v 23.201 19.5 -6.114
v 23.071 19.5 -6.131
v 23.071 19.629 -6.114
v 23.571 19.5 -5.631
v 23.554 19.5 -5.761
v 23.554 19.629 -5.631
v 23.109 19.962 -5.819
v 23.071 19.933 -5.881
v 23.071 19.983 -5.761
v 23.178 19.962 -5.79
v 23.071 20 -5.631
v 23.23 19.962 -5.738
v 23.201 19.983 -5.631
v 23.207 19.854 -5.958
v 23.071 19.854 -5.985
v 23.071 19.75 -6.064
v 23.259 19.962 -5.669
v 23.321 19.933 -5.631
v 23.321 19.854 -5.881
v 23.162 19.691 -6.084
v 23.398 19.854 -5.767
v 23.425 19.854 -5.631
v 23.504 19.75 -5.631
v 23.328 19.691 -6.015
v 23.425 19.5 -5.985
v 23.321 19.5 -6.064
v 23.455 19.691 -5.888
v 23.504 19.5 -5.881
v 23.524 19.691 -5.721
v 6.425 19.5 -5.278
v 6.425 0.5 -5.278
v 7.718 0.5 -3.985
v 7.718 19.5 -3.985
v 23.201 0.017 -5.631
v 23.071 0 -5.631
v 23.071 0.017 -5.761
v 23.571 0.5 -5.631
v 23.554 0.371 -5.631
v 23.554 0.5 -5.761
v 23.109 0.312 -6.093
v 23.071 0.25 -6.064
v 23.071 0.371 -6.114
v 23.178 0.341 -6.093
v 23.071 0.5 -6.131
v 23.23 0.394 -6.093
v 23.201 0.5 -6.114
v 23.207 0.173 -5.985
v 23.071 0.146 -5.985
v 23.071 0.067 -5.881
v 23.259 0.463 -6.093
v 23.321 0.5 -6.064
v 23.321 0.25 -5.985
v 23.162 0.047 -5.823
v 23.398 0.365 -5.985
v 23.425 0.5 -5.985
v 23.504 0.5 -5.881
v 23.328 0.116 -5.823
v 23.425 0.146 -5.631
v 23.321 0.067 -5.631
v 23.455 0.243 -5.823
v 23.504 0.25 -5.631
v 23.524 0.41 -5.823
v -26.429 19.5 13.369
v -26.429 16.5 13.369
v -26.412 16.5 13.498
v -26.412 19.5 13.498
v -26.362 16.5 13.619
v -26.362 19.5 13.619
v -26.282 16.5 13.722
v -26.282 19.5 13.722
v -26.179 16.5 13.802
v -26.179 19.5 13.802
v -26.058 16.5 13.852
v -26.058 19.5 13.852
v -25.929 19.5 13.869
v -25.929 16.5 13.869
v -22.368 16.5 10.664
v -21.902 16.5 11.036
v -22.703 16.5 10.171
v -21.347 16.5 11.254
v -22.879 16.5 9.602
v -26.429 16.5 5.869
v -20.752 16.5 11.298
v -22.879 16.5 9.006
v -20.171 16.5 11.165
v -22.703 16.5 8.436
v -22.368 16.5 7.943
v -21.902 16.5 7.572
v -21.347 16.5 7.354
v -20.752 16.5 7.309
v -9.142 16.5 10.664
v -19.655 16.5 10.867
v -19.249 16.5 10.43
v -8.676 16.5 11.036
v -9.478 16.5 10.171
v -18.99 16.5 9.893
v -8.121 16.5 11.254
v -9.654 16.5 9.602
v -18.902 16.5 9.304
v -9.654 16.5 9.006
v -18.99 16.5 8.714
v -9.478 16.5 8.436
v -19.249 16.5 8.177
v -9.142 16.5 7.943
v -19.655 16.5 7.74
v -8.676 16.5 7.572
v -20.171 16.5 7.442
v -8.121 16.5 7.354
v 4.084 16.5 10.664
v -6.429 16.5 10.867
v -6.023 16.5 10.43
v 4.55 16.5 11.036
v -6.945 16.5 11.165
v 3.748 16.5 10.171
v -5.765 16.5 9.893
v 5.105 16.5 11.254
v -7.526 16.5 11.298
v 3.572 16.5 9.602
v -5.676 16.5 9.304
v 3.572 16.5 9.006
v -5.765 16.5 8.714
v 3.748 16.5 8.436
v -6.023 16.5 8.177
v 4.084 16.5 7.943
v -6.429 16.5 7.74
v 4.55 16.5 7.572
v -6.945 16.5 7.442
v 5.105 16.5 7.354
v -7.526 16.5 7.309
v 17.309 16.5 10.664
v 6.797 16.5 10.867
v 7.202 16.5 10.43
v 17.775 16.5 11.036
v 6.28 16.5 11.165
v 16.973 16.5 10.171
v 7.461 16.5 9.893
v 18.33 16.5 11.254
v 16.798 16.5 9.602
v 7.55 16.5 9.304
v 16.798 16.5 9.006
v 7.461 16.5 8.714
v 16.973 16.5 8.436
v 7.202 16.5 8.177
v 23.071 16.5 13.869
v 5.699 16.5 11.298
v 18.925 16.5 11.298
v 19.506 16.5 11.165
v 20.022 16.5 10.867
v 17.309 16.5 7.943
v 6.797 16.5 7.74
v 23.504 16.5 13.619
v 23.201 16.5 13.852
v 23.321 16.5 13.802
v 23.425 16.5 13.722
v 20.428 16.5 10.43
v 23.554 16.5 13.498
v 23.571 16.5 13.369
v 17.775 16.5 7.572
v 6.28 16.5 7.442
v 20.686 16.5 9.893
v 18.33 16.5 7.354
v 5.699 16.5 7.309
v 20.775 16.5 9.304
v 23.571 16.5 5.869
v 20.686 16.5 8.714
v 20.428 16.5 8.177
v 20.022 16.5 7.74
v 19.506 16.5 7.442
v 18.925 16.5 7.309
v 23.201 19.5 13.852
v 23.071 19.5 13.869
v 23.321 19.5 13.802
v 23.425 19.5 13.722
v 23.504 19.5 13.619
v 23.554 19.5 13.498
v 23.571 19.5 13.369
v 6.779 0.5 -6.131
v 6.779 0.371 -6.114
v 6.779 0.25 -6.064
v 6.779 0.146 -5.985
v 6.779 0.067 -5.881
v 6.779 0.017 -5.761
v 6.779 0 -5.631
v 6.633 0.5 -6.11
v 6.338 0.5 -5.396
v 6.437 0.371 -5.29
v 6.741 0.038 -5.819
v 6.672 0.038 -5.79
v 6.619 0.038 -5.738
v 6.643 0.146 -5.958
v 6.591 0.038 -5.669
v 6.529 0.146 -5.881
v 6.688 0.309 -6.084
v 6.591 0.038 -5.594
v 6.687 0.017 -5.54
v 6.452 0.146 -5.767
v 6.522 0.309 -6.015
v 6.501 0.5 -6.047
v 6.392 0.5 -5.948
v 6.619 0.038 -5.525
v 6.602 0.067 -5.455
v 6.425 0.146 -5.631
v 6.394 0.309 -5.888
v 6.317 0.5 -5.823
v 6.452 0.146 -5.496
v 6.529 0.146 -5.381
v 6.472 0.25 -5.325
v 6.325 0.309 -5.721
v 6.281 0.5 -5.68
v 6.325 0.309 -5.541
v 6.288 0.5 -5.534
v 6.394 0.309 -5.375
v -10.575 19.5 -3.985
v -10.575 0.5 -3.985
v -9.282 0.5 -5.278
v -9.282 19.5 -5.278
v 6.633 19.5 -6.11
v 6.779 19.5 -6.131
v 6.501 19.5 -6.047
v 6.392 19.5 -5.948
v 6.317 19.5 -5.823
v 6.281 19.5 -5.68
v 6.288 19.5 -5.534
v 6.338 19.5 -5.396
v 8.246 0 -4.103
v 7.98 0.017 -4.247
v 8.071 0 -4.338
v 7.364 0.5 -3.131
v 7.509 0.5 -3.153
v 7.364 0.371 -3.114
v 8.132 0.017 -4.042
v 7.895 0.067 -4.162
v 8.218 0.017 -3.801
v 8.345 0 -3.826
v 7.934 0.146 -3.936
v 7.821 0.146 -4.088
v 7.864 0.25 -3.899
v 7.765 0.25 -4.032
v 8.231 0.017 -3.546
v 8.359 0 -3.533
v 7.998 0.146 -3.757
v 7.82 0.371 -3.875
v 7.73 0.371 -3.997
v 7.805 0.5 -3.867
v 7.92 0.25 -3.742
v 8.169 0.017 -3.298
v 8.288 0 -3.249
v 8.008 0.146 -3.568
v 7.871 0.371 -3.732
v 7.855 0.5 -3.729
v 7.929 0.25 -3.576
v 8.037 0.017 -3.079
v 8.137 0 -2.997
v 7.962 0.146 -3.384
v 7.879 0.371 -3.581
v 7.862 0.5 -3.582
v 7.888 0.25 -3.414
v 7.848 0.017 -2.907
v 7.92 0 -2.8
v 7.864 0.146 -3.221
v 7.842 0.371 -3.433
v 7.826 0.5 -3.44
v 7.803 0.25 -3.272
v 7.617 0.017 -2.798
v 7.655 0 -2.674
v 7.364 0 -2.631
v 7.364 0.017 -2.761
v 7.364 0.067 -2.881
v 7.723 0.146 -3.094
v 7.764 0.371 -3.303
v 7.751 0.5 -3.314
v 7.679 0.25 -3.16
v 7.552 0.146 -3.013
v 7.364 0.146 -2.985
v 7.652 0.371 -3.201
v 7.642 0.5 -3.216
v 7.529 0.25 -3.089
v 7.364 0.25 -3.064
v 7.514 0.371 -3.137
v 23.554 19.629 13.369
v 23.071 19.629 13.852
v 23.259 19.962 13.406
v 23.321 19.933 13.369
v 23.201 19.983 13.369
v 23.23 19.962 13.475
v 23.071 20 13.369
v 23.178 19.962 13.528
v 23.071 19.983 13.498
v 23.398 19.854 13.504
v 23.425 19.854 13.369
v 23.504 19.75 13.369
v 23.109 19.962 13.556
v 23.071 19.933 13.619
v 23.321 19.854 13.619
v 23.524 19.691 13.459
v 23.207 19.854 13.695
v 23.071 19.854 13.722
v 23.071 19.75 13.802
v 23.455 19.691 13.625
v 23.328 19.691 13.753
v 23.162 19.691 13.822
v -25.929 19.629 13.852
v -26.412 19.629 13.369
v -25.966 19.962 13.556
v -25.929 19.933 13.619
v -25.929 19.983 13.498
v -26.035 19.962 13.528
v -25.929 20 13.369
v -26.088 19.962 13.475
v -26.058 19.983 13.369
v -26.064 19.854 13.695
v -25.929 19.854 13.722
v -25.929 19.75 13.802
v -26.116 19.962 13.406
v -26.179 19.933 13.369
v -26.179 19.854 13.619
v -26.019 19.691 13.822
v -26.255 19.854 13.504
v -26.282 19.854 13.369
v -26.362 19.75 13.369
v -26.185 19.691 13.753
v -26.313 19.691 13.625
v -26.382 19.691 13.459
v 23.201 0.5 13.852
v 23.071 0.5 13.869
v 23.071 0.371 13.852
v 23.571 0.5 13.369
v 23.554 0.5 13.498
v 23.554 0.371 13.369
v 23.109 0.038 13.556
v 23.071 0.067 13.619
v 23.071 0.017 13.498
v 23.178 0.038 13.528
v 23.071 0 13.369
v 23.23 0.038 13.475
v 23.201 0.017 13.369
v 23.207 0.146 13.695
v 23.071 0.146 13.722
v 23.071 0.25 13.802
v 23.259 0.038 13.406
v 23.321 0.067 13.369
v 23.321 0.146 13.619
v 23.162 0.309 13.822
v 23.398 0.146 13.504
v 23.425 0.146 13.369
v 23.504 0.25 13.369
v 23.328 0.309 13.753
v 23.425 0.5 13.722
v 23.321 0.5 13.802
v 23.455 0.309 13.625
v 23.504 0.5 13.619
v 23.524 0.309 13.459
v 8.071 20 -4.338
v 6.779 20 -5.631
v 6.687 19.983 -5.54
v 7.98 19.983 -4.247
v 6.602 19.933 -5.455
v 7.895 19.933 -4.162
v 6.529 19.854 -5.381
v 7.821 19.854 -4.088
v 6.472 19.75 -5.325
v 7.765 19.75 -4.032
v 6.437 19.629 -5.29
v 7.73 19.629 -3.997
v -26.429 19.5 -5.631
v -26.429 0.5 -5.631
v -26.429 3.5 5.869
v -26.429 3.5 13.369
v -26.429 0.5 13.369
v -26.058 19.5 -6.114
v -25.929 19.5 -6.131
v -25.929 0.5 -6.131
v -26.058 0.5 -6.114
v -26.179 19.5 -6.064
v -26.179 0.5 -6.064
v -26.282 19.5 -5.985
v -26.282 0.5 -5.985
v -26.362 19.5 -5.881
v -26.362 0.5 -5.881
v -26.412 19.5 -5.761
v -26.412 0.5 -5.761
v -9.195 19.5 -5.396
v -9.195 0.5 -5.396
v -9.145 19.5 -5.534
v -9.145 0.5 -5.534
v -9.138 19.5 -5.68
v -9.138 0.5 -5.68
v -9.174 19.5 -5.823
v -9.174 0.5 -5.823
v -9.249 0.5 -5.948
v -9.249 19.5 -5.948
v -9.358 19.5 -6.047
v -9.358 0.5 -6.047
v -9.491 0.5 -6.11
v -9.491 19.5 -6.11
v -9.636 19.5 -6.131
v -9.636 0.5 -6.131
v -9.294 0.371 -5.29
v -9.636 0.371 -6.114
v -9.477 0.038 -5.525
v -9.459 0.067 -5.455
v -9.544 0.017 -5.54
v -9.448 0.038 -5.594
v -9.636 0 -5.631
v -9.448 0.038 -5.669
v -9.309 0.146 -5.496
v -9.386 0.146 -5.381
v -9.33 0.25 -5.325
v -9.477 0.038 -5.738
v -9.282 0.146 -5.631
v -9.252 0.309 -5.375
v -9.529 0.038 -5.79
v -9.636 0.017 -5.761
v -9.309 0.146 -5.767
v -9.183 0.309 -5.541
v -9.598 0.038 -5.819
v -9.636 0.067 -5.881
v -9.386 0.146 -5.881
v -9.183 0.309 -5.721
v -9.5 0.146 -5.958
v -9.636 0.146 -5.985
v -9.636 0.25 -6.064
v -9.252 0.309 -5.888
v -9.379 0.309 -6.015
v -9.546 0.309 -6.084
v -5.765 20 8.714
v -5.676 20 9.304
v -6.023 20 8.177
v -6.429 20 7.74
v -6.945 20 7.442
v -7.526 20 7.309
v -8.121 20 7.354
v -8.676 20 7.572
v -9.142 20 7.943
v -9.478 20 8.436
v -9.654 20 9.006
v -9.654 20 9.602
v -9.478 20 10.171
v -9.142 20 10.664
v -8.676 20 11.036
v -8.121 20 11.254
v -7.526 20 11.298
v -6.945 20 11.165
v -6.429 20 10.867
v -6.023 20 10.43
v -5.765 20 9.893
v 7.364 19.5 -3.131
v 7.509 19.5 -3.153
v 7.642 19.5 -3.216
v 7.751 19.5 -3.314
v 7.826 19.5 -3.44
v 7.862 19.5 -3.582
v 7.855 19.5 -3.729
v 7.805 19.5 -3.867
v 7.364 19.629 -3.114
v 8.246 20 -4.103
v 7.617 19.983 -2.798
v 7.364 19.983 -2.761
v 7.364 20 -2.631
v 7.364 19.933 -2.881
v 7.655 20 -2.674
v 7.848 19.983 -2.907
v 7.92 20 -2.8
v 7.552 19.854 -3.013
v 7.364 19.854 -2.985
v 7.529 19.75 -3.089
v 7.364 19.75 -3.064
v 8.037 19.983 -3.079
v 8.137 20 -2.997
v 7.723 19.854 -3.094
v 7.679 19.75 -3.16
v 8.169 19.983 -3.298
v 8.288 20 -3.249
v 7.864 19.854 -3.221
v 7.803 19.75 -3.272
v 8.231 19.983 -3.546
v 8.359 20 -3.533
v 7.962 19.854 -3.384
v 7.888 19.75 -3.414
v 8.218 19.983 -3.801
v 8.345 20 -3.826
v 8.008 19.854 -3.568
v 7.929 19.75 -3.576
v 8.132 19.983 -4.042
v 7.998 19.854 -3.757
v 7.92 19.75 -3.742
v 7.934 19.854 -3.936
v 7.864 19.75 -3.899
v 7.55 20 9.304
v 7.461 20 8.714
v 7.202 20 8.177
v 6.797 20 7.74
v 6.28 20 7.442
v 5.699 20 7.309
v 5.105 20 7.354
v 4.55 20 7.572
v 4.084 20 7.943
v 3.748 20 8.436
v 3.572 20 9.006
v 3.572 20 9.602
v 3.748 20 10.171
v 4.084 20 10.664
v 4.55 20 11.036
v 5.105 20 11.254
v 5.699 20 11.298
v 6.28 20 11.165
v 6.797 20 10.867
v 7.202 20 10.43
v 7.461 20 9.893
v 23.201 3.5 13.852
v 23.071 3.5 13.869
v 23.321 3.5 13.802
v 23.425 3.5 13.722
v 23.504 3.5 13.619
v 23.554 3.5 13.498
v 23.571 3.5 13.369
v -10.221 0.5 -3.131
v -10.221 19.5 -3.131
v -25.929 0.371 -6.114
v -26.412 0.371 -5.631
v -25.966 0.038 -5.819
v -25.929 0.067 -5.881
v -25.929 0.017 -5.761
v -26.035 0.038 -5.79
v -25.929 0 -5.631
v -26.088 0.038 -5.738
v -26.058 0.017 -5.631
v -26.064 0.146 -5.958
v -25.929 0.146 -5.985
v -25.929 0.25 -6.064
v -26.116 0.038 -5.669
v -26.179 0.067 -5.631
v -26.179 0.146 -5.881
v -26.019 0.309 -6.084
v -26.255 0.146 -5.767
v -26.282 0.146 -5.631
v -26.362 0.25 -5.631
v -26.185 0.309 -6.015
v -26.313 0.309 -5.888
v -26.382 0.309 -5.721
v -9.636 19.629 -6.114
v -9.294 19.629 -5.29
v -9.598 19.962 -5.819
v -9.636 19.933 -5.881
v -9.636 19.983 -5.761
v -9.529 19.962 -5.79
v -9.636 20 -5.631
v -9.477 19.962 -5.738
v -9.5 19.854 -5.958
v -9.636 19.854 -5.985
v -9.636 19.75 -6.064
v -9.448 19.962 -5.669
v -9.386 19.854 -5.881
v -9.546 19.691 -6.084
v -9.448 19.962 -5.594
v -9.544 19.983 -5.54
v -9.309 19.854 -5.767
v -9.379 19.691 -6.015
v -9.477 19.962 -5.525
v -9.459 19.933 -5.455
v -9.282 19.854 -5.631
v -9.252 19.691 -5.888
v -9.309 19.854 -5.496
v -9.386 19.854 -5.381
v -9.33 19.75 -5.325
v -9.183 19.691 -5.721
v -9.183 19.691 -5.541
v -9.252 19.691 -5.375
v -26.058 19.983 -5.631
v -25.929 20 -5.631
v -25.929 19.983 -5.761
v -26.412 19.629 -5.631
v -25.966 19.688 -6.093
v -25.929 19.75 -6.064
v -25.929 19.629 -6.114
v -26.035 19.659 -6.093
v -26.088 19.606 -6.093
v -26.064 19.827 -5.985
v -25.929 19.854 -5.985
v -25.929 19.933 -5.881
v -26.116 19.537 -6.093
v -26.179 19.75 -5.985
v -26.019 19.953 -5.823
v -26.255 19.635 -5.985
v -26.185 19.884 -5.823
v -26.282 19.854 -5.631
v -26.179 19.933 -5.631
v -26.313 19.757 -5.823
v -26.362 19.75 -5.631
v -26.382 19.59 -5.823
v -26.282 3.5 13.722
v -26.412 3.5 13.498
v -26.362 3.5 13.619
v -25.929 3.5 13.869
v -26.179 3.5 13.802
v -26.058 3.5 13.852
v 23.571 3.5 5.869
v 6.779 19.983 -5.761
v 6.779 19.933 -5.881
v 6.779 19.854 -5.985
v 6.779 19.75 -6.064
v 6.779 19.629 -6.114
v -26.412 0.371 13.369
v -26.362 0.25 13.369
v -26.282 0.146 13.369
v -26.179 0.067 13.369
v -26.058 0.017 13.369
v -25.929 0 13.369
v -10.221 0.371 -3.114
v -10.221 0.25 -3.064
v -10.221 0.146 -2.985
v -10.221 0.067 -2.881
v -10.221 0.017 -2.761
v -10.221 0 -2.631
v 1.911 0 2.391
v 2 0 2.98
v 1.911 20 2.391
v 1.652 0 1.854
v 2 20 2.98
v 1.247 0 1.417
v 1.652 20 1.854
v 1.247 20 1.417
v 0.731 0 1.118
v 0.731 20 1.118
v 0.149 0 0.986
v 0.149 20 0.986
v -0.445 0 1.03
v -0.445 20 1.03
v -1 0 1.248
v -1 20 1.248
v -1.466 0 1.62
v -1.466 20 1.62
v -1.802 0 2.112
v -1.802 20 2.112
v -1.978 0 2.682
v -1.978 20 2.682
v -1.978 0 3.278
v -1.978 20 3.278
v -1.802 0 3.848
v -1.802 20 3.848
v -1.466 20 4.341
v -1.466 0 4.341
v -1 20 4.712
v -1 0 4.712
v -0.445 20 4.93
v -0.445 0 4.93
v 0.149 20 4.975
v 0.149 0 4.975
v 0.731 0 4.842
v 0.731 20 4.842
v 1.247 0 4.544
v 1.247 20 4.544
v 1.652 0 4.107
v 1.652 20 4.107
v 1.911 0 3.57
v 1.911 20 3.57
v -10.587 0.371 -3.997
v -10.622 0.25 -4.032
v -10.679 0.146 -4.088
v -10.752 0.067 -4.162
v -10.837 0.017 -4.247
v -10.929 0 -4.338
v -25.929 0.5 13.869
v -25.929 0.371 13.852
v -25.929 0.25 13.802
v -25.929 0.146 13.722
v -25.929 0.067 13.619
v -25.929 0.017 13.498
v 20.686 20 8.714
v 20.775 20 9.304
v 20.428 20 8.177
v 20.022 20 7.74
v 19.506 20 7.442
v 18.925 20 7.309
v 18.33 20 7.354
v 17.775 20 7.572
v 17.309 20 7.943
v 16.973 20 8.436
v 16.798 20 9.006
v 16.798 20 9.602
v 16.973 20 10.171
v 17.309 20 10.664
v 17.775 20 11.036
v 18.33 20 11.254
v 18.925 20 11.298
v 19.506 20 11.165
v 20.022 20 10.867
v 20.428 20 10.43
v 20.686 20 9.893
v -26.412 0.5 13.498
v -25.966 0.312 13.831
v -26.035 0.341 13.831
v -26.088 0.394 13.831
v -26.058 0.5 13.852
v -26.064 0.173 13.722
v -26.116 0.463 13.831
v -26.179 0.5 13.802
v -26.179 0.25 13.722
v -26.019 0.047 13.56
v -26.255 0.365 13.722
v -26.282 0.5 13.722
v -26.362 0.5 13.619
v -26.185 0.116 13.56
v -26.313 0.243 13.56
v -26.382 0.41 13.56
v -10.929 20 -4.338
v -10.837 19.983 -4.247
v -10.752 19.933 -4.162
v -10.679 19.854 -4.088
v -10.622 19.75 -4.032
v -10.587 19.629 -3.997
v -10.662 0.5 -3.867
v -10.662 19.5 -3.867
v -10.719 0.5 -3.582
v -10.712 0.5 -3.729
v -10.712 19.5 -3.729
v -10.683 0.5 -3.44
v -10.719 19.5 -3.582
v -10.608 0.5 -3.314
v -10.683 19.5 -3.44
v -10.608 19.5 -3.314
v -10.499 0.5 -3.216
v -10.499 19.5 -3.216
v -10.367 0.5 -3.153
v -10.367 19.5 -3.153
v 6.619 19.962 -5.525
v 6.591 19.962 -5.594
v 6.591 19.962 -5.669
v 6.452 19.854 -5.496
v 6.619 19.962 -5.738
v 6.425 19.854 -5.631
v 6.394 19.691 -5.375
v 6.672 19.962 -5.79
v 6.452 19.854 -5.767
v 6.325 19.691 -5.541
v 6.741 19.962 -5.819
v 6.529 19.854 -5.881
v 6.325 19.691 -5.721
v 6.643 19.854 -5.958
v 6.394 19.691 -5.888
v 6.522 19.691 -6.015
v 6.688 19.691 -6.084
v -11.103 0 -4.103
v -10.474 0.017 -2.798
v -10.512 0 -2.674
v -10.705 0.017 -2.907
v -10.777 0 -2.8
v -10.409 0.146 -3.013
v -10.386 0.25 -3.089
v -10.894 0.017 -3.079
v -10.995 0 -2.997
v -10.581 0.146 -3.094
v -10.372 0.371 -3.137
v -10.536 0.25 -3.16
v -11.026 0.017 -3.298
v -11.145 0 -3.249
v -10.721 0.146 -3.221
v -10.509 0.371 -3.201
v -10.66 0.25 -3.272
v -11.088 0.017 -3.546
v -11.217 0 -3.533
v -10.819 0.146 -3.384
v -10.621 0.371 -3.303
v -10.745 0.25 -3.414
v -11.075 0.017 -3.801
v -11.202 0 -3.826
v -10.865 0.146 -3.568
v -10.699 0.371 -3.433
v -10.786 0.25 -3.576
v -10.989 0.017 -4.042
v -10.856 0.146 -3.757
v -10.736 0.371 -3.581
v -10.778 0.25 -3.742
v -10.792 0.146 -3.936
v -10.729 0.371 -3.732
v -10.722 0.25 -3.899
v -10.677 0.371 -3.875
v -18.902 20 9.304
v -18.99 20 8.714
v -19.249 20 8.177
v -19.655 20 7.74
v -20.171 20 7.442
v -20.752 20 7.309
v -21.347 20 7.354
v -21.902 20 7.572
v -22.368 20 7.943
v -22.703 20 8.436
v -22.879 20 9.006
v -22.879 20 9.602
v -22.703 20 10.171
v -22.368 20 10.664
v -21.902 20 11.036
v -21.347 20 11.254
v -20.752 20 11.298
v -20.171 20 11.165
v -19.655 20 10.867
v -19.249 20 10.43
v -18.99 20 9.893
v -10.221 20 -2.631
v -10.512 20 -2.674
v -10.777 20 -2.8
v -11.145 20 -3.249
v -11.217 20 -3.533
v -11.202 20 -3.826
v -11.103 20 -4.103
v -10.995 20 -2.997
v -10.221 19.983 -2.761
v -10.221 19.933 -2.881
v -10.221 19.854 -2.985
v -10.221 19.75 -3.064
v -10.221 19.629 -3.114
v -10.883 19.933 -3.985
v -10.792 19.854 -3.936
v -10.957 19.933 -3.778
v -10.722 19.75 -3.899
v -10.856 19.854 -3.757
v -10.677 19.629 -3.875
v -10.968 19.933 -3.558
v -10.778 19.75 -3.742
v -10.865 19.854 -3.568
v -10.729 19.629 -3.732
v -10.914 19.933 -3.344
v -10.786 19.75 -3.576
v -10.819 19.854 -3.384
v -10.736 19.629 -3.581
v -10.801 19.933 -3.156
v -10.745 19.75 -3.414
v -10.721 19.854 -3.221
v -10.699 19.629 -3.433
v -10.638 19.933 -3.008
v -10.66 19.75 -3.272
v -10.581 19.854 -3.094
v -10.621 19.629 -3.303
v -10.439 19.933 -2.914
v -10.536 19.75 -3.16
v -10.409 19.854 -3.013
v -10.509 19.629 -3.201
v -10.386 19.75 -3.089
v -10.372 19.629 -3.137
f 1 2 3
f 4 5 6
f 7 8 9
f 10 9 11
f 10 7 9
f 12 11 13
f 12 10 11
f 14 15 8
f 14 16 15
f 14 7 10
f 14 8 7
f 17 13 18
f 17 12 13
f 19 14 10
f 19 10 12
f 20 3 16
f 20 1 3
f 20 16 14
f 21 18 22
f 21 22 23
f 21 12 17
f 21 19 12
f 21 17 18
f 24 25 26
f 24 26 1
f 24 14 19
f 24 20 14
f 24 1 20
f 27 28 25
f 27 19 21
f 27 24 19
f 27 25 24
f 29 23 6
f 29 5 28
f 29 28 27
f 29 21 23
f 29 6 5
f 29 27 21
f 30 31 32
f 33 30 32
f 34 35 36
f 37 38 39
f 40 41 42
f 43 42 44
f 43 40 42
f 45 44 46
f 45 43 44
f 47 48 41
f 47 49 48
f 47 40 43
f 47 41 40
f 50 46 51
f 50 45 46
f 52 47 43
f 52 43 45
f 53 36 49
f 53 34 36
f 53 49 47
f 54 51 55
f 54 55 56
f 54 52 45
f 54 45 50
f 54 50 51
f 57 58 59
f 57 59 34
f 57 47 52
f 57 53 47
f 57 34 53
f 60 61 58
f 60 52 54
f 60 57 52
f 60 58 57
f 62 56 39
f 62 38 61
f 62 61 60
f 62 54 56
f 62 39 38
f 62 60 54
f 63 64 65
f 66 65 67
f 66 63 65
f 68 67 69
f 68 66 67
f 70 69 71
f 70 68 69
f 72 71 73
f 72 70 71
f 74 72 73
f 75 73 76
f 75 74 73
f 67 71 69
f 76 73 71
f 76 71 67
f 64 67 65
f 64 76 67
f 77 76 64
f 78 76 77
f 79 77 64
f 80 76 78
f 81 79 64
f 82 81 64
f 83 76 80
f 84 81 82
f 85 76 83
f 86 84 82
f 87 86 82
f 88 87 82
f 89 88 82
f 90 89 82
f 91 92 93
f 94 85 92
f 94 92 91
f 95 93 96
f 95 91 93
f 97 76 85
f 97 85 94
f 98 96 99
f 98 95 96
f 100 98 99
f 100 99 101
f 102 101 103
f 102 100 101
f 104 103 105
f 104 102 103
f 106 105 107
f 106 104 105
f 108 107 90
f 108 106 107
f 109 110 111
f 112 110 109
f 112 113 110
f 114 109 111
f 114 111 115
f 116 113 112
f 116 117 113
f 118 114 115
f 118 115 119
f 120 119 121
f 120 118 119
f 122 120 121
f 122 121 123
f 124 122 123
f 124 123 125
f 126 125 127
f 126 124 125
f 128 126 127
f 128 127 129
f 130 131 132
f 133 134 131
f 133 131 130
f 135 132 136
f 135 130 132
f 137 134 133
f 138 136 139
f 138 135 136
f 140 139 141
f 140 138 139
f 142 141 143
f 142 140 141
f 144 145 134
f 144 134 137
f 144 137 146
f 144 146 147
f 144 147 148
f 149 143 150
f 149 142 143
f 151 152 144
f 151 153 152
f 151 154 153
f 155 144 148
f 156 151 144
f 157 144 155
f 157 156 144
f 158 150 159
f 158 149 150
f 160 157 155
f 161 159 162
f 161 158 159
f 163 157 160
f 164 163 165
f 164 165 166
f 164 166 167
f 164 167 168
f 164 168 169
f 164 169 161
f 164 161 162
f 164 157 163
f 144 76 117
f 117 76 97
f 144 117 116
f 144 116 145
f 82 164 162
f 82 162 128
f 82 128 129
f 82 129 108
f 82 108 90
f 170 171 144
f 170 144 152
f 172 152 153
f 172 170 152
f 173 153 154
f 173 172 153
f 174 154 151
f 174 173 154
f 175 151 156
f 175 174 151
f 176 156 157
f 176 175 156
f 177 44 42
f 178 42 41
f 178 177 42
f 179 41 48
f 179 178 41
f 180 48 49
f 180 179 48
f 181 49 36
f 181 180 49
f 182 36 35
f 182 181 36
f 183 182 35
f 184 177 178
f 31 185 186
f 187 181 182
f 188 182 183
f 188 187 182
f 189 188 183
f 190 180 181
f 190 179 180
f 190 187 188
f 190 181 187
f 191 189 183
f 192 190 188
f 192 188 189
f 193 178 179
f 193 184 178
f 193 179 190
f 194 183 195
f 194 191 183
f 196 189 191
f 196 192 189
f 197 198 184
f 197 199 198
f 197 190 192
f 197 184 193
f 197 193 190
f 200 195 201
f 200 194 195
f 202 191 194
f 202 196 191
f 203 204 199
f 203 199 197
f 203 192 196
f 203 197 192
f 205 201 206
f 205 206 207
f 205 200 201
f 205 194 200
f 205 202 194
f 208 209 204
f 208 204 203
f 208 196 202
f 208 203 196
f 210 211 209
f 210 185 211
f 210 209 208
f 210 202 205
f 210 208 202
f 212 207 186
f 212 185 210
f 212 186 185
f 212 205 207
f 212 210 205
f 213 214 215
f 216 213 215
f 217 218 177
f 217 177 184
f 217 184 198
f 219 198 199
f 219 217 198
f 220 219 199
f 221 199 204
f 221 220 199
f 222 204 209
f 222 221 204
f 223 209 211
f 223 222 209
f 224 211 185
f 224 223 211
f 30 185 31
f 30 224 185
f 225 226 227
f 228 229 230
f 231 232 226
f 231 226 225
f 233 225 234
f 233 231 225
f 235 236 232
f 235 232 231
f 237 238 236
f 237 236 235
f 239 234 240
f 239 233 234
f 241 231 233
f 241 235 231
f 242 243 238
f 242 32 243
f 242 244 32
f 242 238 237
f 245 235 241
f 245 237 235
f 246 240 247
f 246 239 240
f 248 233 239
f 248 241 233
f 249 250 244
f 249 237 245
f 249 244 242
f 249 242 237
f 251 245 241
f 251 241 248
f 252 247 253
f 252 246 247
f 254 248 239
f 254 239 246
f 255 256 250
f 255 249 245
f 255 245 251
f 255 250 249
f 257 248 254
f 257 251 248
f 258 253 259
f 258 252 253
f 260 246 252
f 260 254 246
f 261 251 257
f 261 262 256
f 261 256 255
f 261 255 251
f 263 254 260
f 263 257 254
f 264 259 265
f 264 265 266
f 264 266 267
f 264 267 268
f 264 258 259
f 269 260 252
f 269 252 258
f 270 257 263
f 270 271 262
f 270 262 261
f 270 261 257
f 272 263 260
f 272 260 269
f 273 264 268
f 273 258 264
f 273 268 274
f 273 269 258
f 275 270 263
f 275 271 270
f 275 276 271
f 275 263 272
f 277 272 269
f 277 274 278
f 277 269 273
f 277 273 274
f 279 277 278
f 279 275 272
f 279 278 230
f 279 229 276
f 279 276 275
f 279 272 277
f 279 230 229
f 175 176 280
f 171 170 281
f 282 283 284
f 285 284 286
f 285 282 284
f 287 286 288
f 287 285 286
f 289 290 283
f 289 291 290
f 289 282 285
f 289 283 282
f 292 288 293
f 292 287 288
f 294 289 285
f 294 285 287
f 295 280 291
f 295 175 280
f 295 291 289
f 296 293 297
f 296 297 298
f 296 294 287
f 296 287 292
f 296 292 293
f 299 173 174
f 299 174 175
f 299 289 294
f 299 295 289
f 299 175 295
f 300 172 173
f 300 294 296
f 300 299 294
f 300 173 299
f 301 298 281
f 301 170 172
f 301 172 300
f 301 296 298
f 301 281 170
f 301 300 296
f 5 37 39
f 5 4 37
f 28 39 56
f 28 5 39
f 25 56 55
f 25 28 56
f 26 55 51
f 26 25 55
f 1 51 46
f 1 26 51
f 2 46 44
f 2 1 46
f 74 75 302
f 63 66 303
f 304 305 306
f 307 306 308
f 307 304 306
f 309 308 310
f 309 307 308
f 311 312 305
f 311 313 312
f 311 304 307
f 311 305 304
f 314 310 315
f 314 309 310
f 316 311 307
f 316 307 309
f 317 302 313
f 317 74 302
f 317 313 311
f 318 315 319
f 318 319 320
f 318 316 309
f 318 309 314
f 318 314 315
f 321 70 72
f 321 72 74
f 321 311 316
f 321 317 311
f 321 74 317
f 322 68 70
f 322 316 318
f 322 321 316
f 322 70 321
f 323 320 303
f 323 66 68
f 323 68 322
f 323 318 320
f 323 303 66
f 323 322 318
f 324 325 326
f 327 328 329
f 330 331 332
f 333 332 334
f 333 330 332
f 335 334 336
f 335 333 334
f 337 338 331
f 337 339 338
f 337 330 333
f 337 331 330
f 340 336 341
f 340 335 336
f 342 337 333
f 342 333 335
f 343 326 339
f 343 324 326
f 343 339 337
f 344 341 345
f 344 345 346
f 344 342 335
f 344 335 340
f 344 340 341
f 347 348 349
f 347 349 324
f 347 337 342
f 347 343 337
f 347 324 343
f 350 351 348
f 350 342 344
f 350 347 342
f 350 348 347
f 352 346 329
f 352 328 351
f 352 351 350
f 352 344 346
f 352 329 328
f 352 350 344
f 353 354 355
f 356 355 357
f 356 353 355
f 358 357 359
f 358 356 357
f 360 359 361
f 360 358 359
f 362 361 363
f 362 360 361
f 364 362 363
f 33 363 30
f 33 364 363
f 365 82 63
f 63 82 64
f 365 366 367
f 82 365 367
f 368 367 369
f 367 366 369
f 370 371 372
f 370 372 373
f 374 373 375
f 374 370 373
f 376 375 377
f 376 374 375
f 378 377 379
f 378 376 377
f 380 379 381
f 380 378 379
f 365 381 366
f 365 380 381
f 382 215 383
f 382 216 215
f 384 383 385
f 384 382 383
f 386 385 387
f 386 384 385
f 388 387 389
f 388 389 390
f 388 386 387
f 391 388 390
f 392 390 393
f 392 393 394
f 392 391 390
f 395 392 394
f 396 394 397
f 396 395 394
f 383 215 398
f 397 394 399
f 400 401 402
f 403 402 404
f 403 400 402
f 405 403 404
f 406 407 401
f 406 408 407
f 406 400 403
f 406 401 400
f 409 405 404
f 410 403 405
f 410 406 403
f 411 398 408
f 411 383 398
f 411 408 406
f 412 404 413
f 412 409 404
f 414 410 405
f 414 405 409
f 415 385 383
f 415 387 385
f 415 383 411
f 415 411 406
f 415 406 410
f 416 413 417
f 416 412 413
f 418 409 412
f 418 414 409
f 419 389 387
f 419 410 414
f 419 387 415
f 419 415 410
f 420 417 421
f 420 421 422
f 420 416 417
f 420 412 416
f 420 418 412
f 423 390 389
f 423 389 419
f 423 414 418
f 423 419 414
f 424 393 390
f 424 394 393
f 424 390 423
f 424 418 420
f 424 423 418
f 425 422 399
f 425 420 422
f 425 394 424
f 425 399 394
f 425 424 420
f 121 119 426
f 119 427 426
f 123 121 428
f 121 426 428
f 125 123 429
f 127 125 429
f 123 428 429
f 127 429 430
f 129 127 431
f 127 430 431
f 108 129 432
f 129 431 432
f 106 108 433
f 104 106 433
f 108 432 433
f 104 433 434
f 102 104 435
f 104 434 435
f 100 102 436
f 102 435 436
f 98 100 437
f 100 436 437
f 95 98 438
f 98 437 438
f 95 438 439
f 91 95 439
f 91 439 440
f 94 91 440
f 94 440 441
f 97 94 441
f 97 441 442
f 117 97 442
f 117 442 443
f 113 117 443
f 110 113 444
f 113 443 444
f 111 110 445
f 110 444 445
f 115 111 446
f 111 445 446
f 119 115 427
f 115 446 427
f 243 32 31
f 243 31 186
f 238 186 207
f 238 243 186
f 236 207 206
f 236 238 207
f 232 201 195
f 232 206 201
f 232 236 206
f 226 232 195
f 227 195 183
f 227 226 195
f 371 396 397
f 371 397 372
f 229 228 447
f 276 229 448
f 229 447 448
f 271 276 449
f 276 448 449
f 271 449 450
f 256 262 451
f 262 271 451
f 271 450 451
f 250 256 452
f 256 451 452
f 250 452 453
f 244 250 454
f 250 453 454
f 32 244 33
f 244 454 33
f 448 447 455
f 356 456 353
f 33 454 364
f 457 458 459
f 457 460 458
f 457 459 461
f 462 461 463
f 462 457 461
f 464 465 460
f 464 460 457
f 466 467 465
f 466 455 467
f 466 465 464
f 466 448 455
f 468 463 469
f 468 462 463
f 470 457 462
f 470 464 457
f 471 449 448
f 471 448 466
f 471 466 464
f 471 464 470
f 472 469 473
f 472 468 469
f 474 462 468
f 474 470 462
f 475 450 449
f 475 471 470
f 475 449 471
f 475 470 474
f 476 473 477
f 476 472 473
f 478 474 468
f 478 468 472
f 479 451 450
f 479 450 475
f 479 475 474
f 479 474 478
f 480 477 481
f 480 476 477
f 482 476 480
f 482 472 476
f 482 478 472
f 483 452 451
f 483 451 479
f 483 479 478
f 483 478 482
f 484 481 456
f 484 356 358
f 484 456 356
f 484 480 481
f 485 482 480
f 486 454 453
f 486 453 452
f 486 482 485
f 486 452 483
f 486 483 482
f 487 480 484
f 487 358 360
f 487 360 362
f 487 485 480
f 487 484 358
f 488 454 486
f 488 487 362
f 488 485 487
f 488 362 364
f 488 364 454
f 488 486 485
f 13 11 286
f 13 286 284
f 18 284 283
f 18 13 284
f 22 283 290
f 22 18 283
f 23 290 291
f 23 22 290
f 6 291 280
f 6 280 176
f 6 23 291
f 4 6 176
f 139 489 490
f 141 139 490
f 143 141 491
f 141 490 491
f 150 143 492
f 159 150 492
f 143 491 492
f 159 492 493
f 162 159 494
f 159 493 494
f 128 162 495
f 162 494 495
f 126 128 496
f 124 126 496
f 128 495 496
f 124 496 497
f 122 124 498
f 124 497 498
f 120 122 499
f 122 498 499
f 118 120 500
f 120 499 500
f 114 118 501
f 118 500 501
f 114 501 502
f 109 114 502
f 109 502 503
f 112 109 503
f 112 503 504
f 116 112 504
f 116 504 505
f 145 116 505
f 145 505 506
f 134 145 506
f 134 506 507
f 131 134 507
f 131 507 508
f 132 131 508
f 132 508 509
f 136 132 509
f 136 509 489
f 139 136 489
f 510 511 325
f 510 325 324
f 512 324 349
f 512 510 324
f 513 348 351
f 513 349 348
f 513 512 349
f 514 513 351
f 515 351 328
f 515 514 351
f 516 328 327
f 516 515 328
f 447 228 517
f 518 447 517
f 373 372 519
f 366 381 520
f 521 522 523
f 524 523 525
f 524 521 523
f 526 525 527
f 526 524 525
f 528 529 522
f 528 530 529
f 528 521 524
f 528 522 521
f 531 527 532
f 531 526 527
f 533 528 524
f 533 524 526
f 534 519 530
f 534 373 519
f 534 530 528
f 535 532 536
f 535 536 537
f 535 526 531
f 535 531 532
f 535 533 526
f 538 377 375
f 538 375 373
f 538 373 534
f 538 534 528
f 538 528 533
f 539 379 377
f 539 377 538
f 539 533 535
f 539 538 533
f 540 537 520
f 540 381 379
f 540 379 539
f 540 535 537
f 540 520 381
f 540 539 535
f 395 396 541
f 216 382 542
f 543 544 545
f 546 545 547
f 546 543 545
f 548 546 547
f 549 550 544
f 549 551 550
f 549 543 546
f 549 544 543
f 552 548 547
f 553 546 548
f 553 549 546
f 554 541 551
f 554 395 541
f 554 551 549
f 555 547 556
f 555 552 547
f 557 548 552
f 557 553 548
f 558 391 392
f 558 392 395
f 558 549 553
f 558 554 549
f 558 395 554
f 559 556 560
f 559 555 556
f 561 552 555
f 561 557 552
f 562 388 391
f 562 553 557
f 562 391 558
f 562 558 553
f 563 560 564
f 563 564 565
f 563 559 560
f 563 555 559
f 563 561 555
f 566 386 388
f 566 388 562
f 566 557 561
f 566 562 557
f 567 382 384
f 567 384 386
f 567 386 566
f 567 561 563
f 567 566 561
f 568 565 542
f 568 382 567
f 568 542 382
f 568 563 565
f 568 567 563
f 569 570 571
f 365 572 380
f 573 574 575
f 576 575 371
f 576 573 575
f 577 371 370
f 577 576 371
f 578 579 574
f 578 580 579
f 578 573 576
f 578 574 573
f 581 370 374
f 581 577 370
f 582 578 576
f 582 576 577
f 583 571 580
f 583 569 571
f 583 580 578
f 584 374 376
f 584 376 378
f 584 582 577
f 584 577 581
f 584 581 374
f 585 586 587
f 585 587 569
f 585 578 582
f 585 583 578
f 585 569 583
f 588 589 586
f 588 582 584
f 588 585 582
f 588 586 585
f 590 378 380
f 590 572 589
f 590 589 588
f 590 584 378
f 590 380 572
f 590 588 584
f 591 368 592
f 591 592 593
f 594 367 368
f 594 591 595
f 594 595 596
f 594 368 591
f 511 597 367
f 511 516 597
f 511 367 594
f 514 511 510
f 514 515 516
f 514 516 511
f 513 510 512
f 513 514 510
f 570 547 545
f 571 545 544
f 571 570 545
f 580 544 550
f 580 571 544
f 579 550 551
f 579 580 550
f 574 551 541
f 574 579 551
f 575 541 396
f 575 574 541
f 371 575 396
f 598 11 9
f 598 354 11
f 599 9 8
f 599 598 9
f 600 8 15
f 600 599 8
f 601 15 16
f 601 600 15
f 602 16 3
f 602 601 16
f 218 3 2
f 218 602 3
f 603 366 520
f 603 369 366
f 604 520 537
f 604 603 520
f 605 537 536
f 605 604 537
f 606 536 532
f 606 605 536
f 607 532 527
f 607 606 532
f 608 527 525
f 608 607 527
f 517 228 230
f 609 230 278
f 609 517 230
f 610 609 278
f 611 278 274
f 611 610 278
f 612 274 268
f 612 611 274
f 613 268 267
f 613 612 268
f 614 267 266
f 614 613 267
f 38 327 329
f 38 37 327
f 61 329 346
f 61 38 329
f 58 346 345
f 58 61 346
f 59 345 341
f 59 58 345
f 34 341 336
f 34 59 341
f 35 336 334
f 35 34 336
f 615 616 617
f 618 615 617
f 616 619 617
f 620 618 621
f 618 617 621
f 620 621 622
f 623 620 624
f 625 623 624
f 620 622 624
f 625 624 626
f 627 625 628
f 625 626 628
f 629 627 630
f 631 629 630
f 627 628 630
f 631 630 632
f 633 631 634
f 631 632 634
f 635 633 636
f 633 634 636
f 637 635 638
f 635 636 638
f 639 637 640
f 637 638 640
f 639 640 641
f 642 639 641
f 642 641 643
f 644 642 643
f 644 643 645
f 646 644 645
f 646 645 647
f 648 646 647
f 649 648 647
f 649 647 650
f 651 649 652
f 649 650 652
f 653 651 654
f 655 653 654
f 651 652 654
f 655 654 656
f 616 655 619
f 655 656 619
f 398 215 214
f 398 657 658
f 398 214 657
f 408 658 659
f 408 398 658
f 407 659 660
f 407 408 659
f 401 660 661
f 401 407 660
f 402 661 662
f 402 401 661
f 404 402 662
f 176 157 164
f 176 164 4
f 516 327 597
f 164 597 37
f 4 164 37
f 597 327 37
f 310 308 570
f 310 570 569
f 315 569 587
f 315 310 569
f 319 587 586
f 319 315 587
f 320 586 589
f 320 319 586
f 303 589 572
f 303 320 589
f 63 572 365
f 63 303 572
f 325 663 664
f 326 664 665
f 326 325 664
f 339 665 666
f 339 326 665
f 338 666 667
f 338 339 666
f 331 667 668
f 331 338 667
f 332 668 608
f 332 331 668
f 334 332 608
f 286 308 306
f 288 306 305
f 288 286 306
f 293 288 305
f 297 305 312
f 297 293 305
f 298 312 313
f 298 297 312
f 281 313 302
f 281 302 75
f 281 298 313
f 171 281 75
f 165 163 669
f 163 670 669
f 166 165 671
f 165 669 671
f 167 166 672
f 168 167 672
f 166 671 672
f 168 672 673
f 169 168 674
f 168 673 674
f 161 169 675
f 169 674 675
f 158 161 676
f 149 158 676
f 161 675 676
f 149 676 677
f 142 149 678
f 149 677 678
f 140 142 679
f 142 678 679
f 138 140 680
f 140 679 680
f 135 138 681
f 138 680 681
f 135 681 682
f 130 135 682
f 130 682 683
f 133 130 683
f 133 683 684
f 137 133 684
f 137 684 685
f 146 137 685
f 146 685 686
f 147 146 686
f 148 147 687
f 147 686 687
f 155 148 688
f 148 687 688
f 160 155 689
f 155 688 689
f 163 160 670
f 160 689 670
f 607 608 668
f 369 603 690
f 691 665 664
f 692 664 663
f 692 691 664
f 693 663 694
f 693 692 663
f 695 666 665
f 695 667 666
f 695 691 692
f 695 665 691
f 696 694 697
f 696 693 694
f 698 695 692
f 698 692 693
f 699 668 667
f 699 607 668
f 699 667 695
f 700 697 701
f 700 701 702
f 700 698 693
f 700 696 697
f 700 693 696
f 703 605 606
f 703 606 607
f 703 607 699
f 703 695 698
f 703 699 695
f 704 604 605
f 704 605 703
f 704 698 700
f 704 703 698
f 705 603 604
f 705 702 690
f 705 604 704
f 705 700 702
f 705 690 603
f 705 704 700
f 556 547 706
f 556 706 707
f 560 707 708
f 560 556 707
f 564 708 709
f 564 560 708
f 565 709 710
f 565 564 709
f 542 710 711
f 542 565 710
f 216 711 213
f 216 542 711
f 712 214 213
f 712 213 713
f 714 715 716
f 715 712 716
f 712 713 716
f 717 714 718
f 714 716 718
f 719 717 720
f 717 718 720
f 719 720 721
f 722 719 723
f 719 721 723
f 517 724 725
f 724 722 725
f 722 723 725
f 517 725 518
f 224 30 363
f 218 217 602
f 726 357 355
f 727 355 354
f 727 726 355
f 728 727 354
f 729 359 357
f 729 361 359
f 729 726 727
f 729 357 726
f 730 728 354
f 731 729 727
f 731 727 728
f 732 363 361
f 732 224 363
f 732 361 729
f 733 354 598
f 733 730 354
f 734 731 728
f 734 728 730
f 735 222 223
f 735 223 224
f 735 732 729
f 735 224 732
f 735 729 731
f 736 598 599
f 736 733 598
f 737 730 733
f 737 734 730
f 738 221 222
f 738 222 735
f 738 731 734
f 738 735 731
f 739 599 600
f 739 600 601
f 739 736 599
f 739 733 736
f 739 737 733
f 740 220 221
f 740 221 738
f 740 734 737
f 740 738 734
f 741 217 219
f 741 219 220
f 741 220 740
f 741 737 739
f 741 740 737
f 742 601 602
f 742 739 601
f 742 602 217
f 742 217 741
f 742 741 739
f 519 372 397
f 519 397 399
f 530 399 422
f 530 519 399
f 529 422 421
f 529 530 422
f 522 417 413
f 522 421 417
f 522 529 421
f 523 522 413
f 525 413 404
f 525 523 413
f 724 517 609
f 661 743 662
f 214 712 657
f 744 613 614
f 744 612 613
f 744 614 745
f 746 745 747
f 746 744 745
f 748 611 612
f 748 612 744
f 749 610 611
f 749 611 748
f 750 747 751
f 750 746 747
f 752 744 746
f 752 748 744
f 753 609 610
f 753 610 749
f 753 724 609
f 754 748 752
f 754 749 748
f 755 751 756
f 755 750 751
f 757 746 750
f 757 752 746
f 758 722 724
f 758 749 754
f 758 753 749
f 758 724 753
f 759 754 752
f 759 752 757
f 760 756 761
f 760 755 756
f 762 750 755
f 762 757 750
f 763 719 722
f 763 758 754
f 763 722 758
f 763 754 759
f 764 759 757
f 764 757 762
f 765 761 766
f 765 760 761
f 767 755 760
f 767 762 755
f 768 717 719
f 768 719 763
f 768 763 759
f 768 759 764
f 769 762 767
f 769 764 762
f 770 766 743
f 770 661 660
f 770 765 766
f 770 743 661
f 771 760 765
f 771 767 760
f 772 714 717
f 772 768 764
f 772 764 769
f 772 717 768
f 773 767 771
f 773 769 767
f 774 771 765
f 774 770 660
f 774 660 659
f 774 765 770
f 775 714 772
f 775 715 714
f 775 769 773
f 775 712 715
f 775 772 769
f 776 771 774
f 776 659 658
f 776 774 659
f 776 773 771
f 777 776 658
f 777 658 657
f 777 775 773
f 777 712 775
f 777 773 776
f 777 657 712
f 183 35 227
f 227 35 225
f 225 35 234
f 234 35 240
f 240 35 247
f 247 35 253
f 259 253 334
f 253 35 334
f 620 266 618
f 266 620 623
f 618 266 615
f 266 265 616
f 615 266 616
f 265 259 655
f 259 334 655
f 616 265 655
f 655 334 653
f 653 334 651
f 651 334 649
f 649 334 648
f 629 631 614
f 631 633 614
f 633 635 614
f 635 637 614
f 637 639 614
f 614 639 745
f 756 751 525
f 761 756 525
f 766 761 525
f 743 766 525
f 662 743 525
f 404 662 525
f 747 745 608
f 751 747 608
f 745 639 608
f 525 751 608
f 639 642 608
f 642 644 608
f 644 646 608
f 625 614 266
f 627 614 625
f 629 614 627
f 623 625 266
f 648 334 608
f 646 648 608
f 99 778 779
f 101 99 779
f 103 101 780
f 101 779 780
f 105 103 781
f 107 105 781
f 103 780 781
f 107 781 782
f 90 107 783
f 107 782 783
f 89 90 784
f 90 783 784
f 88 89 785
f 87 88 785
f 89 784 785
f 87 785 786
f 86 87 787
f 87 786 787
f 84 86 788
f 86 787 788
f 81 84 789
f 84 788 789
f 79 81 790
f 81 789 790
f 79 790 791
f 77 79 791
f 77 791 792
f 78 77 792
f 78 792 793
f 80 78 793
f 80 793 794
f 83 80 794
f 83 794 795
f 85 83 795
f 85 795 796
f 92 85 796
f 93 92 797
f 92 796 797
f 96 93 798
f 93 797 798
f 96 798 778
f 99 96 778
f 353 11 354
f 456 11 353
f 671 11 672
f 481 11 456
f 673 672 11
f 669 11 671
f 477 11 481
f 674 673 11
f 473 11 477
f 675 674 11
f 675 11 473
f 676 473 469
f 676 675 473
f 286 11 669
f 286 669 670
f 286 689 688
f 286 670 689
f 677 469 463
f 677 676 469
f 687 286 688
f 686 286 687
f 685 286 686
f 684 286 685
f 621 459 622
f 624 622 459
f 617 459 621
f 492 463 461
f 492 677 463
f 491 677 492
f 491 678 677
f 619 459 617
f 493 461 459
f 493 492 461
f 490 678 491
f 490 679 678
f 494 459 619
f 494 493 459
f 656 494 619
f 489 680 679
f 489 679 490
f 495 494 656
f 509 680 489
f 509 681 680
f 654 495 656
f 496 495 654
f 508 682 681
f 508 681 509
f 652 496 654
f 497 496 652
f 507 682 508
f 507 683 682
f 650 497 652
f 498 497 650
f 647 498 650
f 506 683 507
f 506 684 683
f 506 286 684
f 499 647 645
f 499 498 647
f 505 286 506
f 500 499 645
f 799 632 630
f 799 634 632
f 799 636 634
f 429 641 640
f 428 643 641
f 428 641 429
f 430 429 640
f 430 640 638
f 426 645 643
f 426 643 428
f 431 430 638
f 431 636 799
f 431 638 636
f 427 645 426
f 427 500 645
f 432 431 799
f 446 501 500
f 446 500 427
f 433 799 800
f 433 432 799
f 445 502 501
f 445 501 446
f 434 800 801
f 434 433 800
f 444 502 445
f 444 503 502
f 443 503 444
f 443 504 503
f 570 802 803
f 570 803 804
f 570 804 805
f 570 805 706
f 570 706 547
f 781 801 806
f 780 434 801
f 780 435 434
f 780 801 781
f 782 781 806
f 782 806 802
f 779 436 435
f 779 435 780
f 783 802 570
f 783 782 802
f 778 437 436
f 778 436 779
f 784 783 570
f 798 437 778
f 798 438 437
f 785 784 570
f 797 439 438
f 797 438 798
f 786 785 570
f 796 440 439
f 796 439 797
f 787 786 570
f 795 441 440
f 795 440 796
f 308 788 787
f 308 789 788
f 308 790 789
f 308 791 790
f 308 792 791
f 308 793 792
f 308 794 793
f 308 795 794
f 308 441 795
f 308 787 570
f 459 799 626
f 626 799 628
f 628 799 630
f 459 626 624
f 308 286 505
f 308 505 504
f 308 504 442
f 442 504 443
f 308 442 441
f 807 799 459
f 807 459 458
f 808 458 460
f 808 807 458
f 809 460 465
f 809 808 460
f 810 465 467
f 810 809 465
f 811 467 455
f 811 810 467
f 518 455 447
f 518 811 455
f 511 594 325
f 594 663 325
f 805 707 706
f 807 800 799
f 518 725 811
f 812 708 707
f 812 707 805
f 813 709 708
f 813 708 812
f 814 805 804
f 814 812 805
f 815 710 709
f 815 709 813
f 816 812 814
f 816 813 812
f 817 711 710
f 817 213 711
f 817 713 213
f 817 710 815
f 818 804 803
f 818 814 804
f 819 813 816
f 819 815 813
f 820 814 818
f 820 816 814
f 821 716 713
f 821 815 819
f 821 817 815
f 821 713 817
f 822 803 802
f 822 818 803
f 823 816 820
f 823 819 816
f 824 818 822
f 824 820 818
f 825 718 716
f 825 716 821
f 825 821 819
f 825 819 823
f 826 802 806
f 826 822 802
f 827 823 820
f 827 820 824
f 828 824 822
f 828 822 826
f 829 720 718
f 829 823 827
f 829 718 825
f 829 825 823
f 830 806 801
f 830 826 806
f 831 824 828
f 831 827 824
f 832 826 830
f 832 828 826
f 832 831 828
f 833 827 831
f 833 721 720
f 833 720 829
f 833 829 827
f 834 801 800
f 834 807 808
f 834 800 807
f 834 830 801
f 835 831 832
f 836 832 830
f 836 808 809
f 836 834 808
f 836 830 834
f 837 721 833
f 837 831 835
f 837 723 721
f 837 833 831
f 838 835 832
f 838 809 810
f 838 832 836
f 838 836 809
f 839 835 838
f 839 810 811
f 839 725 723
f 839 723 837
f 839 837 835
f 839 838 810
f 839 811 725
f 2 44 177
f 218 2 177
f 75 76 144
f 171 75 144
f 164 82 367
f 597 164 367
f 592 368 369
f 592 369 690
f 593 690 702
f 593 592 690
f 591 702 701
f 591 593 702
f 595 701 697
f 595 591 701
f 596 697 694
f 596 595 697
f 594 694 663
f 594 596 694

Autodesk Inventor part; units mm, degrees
ref_plane "YZ Plane" through (0, 0, 0) normal (1, 0, 0) x (0, 1, 0)
ref_plane "XZ Plane" through (0, 0, 0) normal (0, 1, 0) x (-1, 0, 0)
ref_plane "XY Plane" through (0, 0, 0) normal (0, 0, 1) x (1, 0, 0)
sketch "Sketch1" plane through (0, 0, 0) normal (0, 1, 0) x (-1, 0, 0)
  line L0 (26.4286, 13.8687) -> (-23.5714, 13.8687)
  line L1 (-23.5714, 13.8687) -> (-23.5714, -6.1313)
  line L2 (-23.5714, -6.1313) -> (-5.5714, -6.1313)
  line L3 (-5.5714, -6.1313) -> (-8.5714, -3.1313)
  line L4 (-8.5714, -3.1313) -> (11.4286, -3.1313)
  line L5 (11.4286, -3.1313) -> (8.4286, -6.1313)
  line L6 (8.4286, -6.1313) -> (26.4286, -6.1313)
  line L7 (26.4286, -6.1313) -> (26.4286, 13.8687)
  point P0 (0, 0)
  dimension "d0" = 50
  dimension "d15" = 20
  dimension "d16" = 3
  dimension "d17" = 45
  dimension "d22" = 20
extrude "Extrusion1" add sketch "Sketch1" along normal blind 20
sketch "Sketch2" plane through (23.5714, 0, 13.8687) normal (1, 0, 0) x (0, 0, -1)
  line L0 (0, 0) -> (0, 20) projected
  line L1 (0, 16.5) -> (8, 16.5)
  line L2 (8, 16.5) -> (8, 3.5)
  line L3 (8, 3.5) -> (0, 3.5)
  line L4 (0, 3.5) -> (0, 16.5)
  line L5 (0, 20) -> (20, 20) projected
  line L6 (5.2007, 20) -> (5.2007, 16.5) construction
  line L7 (5.2007, 3.5) -> (5.2007, 0) construction
  line L8 (0, 0) -> (20, 0) projected
  point P0 (13.8687, 0)
  dimension "d5" = 8
  dimension "d6" = 13
extrude "Extrusion2" cut sketch "Sketch2" against normal through all
sketch "Sketch3" plane through (0, 20, 0) normal (0, 1, 0) x (1, 0, 0)
  circle A0 centre (-20.9015, -9.3037) radius 2
  circle A1 centre (-7.6759, -9.3037) radius 2
  circle A2 centre (5.5497, -9.3037) radius 2
  circle A3 centre (18.7753, -9.3037) radius 2
  line L0 (-20.9015, -9.3037) -> (-7.6759, -9.3037) construction
  line L1 (-7.6759, -9.3037) -> (5.5497, -9.3037) construction
  line L2 (5.5497, -9.3037) -> (18.7753, -9.3037) construction
  point P0 (0, 0)
  dimension "d9" = 4
  dimension "d10" = 4
  dimension "d11" = 4
  dimension "d12" = 4
extrude "Extrusion3" cut sketch "Sketch3" against normal blind 5
fillet "Fillet1" radius 0.5 26 edges at (-26.4286, 18.25, 13.8687) (-26.4286, 20, 3.8687) (-26.4286, 10, -6.1313) (-26.4286, 0, 3.8687) (-26.4286, 1.75, 13.8687) (23.5714, 18.25, 13.8687) (-1.4286, 20, 13.8687) (23.5714, 1.75, 13.8687) (23.5714, 0, 3.8687) (23.5714, 10, -6.1313) (23.5714, 20, 3.8687) (-17.4286, 0, -6.1313) (-17.4286, 20, -6.1313) (-8.4286, 10, -6.1313) (-9.9286, 0, -4.6313) (-9.9286, 20, -4.6313) (-11.4286, 10, -3.1313) (-1.4286, 0, -3.1313) (-1.4286, 20, -3.1313) (8.5714, 10, -3.1313) (7.0714, 0, -4.6313) (7.0714, 20, -4.6313) (5.5714, 10, -6.1313) (14.5714, 0, -6.1313) (14.5714, 20, -6.1313) (-1.4286, 0, 13.8687)
sketch "Sketch4" plane through (0, 20, 0) normal (0, 1, 0) x (1, 0, 0)
  circle A0 centre (0, -2.9802) radius 2
  point P0 (0, 0)
  dimension "d19" = 4
extrude "Extrusion4" cut sketch "Sketch4" against normal through all
properties part number "Turning and Facing Holder"
